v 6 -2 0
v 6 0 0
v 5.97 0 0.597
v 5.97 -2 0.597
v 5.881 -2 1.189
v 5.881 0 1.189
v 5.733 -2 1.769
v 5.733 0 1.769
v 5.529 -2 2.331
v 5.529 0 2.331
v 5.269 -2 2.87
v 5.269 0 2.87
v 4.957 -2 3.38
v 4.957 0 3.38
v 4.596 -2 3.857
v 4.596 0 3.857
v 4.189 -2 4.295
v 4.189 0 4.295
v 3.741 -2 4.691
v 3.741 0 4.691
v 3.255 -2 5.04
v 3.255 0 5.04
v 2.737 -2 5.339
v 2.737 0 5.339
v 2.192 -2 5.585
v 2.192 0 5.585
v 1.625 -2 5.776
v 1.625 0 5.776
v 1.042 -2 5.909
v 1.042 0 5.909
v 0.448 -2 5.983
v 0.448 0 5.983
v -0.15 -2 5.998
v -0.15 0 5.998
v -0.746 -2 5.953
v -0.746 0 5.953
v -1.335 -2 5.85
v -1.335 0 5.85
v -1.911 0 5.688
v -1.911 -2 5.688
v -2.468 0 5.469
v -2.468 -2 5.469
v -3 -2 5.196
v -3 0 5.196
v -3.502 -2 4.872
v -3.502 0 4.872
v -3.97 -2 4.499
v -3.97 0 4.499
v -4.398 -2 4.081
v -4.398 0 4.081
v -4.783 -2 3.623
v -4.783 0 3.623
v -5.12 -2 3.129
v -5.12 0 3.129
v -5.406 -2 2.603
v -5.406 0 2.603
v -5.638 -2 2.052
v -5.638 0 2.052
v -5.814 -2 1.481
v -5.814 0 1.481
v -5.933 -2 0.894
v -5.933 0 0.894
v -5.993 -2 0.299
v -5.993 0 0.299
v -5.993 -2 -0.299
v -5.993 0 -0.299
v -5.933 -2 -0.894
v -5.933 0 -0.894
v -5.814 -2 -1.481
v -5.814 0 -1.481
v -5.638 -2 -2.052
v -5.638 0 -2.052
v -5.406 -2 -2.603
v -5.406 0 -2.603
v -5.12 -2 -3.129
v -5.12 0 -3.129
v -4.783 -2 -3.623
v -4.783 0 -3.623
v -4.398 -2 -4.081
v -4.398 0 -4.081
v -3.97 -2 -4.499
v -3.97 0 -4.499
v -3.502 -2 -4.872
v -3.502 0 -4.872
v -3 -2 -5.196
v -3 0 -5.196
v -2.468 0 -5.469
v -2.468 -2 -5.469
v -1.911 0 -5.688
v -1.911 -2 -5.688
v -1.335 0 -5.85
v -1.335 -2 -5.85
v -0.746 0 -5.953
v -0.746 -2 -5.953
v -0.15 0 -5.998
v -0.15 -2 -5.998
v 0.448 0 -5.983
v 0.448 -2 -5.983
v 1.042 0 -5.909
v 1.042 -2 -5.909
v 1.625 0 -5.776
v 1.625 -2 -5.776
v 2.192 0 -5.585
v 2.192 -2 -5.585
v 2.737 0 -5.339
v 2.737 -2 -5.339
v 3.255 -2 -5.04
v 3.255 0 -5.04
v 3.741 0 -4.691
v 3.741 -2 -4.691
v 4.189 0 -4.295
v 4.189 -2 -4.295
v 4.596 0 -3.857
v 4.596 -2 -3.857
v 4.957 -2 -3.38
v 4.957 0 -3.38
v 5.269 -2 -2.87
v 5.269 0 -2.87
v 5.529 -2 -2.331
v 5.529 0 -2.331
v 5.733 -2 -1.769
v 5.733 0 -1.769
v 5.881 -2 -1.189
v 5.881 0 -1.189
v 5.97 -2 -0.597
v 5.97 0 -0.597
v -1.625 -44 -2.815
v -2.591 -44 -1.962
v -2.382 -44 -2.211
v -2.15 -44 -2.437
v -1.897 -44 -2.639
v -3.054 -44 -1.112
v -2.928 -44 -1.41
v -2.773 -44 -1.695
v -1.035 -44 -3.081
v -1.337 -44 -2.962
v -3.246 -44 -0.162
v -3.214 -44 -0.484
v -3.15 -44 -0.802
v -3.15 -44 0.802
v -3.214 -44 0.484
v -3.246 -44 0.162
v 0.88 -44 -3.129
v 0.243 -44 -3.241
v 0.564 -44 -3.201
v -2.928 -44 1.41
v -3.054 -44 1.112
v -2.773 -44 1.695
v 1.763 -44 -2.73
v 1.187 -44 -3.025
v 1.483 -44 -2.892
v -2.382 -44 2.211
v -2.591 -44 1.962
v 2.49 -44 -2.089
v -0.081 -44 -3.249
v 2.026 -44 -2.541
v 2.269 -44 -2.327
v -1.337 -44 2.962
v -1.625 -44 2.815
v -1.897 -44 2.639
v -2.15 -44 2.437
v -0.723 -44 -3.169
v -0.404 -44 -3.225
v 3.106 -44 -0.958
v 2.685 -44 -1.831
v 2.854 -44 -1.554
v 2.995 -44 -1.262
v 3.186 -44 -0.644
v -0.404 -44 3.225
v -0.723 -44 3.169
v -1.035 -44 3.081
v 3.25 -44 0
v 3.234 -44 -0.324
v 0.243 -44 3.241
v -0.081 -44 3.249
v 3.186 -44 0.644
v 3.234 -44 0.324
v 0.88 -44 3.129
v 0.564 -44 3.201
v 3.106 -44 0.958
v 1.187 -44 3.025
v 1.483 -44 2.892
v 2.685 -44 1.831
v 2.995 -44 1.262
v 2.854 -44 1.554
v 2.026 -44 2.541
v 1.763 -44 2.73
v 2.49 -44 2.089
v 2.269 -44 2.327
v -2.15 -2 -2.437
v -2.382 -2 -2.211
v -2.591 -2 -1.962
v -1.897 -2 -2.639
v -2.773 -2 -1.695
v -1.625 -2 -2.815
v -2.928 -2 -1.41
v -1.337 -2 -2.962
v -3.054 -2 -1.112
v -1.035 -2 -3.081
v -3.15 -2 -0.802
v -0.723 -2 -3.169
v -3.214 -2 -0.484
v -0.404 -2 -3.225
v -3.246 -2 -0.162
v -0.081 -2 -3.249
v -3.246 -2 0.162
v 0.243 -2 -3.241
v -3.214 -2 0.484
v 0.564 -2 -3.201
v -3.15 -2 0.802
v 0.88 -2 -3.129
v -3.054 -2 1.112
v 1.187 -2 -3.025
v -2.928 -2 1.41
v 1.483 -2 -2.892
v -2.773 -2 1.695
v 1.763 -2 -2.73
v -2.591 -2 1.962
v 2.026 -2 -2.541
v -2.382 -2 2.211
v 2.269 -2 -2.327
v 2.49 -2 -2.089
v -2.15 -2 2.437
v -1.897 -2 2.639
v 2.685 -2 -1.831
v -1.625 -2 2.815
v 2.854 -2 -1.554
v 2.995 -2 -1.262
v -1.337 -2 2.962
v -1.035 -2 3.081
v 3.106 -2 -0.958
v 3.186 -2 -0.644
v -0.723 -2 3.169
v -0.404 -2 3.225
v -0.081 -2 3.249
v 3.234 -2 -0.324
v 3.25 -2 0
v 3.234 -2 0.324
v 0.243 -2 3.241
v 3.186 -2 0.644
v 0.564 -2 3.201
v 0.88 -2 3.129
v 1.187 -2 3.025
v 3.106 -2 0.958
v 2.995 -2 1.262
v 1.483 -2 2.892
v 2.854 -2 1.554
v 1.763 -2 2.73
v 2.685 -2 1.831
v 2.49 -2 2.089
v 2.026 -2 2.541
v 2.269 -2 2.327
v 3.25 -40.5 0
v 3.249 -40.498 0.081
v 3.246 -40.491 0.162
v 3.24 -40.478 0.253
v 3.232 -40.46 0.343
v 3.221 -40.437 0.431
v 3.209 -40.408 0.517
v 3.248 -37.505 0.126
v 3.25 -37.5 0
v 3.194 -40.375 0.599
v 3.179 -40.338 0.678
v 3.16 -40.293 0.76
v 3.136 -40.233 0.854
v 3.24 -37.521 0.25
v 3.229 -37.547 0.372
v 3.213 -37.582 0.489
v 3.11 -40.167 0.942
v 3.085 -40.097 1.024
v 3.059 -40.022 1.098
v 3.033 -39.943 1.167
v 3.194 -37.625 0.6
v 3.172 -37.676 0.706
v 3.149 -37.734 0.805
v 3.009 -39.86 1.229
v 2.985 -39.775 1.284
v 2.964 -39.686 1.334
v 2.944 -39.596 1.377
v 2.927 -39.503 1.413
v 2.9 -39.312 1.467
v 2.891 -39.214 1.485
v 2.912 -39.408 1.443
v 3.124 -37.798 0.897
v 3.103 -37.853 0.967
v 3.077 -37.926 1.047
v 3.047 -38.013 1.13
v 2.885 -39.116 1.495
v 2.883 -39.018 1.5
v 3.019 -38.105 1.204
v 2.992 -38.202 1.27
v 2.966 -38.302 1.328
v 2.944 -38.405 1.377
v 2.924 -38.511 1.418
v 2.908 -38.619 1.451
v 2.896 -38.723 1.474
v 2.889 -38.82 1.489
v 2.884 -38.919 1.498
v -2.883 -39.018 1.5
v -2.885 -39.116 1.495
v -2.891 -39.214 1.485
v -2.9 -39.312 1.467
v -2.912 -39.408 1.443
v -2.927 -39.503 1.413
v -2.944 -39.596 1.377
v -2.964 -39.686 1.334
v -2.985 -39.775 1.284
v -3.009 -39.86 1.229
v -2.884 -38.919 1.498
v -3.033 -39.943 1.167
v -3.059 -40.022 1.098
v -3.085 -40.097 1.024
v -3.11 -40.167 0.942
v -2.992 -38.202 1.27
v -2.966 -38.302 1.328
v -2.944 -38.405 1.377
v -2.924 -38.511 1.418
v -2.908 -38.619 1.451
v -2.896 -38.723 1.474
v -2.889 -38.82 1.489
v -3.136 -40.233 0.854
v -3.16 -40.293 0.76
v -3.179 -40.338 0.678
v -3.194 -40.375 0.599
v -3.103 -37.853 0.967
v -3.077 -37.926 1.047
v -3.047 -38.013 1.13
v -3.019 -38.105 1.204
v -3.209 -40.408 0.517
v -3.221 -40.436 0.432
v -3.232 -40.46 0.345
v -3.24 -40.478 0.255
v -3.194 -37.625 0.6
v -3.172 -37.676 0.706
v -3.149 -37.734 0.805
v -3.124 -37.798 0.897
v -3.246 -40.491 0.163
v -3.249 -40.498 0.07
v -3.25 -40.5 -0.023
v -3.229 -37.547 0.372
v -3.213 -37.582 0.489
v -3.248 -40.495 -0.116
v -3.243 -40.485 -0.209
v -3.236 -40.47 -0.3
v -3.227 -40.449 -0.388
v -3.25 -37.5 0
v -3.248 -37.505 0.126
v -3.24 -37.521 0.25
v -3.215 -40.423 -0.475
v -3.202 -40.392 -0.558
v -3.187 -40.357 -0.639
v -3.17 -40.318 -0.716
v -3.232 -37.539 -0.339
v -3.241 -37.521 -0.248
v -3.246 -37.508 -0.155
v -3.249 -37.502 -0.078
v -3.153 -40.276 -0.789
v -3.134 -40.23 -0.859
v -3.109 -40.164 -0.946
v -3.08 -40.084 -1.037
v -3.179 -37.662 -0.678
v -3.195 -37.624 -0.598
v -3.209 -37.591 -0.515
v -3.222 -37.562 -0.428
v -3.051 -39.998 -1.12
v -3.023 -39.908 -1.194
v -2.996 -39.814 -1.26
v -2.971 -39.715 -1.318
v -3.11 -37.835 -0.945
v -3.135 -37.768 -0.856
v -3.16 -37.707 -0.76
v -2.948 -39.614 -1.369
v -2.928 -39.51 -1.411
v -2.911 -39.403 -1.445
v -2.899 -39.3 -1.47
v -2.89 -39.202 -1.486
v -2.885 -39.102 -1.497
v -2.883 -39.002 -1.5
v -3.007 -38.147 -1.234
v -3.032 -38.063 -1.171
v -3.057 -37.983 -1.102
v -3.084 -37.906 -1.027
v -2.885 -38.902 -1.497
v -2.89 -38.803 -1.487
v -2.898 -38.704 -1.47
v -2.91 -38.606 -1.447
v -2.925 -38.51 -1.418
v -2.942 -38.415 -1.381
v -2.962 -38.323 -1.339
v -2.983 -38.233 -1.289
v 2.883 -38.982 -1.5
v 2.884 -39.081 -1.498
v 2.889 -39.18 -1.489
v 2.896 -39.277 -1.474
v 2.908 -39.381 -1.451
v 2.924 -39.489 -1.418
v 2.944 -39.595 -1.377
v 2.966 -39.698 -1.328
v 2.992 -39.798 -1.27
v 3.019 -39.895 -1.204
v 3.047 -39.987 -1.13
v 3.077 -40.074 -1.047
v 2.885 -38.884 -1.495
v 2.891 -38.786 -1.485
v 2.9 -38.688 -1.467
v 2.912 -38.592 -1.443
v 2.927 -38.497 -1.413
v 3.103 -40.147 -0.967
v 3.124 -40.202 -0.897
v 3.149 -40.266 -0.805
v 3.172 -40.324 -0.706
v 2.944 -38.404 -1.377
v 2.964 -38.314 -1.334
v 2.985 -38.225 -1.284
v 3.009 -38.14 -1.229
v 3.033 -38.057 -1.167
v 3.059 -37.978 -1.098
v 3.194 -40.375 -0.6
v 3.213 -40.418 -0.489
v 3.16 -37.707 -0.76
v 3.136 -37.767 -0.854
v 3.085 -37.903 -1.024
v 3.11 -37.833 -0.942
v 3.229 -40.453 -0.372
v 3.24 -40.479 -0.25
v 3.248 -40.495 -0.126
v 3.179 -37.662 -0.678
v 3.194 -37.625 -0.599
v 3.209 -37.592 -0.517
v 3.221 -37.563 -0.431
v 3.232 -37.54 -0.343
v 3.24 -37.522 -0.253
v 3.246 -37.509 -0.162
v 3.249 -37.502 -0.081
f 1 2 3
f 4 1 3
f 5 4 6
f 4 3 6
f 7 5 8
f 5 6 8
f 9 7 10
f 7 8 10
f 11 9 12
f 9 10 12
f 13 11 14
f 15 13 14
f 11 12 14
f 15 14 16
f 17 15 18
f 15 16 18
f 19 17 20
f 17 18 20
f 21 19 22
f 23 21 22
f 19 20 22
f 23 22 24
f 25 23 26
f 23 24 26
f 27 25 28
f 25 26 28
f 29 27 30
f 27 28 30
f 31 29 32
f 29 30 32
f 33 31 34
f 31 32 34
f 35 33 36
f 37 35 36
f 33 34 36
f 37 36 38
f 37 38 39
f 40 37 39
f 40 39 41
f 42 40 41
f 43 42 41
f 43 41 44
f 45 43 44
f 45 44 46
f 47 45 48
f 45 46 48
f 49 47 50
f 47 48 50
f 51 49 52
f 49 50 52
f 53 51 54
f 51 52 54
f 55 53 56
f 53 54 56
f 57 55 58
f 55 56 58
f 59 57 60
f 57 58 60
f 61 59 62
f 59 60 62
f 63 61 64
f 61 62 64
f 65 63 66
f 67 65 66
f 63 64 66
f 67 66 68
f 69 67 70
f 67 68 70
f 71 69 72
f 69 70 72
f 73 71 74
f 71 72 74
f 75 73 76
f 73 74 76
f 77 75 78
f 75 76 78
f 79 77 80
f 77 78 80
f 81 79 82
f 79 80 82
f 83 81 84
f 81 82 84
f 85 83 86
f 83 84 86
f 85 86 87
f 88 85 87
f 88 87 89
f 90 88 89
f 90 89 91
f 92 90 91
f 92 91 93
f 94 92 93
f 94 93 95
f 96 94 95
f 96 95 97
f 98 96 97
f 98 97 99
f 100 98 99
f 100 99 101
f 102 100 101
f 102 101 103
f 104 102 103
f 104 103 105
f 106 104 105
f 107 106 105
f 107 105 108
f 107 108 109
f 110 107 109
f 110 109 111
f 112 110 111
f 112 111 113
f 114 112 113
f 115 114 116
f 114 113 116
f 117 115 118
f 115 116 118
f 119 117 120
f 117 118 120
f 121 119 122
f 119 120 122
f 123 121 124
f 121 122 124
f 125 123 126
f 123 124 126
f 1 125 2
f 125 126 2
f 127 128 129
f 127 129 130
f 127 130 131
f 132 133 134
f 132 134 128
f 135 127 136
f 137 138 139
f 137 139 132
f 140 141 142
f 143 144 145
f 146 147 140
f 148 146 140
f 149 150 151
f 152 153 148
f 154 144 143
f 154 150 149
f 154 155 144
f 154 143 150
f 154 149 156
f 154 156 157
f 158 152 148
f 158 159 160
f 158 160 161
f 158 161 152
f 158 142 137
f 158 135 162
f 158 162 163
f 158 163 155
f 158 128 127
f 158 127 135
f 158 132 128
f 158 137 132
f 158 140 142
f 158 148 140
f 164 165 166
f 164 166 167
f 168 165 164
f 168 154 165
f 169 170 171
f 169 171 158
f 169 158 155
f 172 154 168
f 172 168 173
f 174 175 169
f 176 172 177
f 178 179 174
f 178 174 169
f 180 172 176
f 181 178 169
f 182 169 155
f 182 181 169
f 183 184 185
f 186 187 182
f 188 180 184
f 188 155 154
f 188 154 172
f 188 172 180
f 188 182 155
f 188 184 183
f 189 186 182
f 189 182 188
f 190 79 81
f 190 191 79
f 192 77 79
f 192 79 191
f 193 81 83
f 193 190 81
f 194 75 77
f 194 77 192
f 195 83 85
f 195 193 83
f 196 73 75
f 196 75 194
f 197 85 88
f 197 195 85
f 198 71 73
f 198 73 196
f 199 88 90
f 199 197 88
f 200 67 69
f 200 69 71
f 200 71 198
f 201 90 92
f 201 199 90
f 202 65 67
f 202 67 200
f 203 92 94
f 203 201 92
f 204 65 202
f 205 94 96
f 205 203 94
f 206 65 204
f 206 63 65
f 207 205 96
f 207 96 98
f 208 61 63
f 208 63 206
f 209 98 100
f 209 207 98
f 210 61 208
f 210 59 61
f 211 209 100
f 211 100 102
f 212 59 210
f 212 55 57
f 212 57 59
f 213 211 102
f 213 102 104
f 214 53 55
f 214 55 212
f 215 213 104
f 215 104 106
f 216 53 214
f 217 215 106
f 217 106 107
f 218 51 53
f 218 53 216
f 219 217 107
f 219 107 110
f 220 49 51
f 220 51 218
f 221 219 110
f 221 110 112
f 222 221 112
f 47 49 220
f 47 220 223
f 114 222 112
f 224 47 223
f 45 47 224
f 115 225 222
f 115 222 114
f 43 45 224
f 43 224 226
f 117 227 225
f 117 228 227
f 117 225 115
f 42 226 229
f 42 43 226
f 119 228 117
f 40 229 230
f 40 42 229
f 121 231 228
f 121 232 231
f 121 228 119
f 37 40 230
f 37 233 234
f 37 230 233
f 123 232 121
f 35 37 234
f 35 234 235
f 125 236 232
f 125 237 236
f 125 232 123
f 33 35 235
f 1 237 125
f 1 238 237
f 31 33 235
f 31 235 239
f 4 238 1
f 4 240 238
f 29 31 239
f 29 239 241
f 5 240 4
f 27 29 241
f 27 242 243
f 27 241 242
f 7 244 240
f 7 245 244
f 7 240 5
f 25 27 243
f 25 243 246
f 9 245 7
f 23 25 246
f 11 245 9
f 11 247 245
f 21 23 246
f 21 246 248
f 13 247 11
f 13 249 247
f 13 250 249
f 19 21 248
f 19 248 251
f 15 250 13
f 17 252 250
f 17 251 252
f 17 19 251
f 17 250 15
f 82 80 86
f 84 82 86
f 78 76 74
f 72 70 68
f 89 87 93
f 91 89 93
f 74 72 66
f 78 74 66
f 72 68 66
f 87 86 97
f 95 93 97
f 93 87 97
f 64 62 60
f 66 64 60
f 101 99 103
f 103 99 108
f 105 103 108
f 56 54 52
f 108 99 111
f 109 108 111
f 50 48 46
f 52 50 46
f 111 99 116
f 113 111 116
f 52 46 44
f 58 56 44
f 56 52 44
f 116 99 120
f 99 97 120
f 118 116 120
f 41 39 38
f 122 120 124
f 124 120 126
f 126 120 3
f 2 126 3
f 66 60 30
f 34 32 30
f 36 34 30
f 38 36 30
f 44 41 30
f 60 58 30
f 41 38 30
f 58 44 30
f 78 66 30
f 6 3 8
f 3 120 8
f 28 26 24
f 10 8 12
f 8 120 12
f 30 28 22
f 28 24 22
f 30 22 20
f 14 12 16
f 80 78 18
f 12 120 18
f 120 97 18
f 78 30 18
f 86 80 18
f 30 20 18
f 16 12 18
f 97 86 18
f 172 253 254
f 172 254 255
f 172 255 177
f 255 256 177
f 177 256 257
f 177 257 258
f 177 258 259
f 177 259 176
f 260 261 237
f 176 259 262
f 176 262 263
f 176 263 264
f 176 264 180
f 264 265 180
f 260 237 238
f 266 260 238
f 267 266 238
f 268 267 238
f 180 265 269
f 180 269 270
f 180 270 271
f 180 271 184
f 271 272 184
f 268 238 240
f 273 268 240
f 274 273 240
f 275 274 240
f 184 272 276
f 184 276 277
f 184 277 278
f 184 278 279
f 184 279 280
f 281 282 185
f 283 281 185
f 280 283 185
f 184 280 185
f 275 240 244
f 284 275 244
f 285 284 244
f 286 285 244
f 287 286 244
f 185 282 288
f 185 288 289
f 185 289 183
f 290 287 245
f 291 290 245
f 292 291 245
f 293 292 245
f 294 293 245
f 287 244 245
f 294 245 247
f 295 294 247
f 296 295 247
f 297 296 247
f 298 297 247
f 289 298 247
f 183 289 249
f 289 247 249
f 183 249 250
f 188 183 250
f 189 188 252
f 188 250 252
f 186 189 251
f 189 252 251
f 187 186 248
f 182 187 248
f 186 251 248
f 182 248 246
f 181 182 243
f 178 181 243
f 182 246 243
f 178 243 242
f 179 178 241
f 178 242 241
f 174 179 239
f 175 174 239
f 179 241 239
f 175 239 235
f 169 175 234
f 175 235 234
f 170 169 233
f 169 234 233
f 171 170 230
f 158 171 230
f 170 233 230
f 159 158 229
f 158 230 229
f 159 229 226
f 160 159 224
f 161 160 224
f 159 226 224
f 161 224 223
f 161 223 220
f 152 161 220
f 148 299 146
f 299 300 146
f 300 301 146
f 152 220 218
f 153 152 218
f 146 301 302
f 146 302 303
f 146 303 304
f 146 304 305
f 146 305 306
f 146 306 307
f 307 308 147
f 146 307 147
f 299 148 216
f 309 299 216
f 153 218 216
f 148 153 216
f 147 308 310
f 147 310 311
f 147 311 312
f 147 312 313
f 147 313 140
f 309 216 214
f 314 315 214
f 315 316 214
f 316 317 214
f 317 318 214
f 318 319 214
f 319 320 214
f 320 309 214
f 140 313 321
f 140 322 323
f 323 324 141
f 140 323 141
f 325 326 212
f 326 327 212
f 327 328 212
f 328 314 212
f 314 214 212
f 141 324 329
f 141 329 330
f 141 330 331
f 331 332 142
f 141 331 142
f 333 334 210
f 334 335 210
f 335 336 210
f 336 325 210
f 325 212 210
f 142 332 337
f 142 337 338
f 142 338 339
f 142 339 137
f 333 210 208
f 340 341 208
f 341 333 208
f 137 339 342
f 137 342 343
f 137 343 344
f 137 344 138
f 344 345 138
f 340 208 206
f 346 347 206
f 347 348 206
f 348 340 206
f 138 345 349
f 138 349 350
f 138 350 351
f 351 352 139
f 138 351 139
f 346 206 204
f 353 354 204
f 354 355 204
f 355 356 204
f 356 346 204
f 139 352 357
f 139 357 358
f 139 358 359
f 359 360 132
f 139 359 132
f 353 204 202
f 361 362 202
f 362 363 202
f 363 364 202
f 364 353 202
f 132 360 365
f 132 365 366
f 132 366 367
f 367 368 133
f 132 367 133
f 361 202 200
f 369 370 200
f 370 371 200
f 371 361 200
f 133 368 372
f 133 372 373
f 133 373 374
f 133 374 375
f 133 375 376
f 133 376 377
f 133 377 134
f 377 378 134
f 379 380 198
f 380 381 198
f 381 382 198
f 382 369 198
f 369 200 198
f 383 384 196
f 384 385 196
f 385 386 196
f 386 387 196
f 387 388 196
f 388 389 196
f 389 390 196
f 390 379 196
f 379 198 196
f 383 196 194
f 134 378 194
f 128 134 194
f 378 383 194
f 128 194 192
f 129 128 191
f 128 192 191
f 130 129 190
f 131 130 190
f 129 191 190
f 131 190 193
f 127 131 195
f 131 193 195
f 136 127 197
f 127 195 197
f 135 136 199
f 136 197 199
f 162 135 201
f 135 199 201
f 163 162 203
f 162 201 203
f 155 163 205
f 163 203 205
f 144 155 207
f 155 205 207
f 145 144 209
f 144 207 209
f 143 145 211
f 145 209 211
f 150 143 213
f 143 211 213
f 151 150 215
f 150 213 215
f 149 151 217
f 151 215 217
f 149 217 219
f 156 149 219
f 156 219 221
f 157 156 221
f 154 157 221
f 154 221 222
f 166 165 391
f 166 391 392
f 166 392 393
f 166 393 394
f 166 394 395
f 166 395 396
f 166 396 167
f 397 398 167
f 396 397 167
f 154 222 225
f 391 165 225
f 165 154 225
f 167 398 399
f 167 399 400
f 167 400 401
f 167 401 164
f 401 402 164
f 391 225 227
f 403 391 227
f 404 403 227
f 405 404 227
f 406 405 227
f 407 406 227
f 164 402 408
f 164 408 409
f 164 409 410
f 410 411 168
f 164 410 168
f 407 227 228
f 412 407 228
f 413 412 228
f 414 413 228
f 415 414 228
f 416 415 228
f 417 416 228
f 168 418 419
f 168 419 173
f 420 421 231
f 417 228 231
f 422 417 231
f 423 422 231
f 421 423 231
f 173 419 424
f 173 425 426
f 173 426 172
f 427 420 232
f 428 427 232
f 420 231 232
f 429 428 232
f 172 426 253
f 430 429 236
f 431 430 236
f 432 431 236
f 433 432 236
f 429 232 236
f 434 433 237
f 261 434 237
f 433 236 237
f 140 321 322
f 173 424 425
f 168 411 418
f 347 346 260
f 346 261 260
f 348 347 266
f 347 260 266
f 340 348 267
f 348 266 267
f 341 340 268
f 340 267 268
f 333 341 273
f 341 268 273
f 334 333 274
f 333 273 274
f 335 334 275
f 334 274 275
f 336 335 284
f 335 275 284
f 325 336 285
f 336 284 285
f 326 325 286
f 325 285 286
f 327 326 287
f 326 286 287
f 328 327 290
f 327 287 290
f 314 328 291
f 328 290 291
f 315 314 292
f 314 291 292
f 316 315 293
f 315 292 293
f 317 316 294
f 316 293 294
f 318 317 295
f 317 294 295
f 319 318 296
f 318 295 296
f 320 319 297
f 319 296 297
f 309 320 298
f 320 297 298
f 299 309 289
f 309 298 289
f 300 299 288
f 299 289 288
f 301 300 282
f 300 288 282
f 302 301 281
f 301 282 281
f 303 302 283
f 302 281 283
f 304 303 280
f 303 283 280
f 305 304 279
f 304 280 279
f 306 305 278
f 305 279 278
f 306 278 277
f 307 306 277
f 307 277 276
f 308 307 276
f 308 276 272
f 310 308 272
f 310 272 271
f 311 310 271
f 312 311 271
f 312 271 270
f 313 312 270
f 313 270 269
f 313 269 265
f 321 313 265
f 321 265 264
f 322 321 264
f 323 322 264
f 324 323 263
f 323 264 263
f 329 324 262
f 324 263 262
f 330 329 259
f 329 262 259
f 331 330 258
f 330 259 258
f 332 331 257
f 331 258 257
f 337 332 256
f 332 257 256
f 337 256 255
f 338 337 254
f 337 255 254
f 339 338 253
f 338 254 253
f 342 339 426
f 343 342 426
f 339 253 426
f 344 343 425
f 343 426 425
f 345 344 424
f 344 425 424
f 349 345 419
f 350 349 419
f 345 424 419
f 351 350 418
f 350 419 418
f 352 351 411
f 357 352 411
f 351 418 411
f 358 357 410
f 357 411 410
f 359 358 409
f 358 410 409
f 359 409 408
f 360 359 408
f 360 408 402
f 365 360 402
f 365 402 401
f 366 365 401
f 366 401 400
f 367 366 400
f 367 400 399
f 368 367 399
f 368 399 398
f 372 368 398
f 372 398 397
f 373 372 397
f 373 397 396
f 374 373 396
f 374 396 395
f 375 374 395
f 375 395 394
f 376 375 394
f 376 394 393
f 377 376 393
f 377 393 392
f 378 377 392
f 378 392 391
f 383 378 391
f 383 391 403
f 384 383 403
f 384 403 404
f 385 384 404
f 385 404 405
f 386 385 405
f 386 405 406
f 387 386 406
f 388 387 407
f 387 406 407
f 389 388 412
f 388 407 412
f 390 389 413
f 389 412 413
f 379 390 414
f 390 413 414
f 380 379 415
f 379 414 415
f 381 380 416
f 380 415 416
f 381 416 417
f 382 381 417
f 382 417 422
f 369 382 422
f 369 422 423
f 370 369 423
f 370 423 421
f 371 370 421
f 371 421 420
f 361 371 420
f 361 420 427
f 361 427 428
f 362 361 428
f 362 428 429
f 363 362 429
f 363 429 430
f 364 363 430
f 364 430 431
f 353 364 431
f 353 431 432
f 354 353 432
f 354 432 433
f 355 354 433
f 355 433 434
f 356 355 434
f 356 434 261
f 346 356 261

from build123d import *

# Parameters (mm, degrees)
F0_R     = 3.25
F1_DEPTH = 44
F0_R_2   = 6
F2_DEPTH = 2
F3_R     = 1.5
F4_DEPTH = 5


with BuildPart() as f1:
    # F0 (on Front) → F1 (new body)
    with BuildSketch(Plane.XZ):
        Circle(F0_R)
    extrude(amount=F1_DEPTH)

    # F0 (on Front) → F2 (join)
    with BuildSketch(Plane.XZ):
        Circle(F0_R_2)
        Circle(F0_R, mode=Mode.SUBTRACT)
    extrude(amount=F2_DEPTH)

    # F3 (on Right) → F4 (cut, symmetric)
    with BuildSketch(Plane.YZ):
        with Locations((-39, 0)):
            Circle(F3_R)
    extrude(amount=F4_DEPTH, both=True, mode=Mode.SUBTRACT)


solid = f1.part
